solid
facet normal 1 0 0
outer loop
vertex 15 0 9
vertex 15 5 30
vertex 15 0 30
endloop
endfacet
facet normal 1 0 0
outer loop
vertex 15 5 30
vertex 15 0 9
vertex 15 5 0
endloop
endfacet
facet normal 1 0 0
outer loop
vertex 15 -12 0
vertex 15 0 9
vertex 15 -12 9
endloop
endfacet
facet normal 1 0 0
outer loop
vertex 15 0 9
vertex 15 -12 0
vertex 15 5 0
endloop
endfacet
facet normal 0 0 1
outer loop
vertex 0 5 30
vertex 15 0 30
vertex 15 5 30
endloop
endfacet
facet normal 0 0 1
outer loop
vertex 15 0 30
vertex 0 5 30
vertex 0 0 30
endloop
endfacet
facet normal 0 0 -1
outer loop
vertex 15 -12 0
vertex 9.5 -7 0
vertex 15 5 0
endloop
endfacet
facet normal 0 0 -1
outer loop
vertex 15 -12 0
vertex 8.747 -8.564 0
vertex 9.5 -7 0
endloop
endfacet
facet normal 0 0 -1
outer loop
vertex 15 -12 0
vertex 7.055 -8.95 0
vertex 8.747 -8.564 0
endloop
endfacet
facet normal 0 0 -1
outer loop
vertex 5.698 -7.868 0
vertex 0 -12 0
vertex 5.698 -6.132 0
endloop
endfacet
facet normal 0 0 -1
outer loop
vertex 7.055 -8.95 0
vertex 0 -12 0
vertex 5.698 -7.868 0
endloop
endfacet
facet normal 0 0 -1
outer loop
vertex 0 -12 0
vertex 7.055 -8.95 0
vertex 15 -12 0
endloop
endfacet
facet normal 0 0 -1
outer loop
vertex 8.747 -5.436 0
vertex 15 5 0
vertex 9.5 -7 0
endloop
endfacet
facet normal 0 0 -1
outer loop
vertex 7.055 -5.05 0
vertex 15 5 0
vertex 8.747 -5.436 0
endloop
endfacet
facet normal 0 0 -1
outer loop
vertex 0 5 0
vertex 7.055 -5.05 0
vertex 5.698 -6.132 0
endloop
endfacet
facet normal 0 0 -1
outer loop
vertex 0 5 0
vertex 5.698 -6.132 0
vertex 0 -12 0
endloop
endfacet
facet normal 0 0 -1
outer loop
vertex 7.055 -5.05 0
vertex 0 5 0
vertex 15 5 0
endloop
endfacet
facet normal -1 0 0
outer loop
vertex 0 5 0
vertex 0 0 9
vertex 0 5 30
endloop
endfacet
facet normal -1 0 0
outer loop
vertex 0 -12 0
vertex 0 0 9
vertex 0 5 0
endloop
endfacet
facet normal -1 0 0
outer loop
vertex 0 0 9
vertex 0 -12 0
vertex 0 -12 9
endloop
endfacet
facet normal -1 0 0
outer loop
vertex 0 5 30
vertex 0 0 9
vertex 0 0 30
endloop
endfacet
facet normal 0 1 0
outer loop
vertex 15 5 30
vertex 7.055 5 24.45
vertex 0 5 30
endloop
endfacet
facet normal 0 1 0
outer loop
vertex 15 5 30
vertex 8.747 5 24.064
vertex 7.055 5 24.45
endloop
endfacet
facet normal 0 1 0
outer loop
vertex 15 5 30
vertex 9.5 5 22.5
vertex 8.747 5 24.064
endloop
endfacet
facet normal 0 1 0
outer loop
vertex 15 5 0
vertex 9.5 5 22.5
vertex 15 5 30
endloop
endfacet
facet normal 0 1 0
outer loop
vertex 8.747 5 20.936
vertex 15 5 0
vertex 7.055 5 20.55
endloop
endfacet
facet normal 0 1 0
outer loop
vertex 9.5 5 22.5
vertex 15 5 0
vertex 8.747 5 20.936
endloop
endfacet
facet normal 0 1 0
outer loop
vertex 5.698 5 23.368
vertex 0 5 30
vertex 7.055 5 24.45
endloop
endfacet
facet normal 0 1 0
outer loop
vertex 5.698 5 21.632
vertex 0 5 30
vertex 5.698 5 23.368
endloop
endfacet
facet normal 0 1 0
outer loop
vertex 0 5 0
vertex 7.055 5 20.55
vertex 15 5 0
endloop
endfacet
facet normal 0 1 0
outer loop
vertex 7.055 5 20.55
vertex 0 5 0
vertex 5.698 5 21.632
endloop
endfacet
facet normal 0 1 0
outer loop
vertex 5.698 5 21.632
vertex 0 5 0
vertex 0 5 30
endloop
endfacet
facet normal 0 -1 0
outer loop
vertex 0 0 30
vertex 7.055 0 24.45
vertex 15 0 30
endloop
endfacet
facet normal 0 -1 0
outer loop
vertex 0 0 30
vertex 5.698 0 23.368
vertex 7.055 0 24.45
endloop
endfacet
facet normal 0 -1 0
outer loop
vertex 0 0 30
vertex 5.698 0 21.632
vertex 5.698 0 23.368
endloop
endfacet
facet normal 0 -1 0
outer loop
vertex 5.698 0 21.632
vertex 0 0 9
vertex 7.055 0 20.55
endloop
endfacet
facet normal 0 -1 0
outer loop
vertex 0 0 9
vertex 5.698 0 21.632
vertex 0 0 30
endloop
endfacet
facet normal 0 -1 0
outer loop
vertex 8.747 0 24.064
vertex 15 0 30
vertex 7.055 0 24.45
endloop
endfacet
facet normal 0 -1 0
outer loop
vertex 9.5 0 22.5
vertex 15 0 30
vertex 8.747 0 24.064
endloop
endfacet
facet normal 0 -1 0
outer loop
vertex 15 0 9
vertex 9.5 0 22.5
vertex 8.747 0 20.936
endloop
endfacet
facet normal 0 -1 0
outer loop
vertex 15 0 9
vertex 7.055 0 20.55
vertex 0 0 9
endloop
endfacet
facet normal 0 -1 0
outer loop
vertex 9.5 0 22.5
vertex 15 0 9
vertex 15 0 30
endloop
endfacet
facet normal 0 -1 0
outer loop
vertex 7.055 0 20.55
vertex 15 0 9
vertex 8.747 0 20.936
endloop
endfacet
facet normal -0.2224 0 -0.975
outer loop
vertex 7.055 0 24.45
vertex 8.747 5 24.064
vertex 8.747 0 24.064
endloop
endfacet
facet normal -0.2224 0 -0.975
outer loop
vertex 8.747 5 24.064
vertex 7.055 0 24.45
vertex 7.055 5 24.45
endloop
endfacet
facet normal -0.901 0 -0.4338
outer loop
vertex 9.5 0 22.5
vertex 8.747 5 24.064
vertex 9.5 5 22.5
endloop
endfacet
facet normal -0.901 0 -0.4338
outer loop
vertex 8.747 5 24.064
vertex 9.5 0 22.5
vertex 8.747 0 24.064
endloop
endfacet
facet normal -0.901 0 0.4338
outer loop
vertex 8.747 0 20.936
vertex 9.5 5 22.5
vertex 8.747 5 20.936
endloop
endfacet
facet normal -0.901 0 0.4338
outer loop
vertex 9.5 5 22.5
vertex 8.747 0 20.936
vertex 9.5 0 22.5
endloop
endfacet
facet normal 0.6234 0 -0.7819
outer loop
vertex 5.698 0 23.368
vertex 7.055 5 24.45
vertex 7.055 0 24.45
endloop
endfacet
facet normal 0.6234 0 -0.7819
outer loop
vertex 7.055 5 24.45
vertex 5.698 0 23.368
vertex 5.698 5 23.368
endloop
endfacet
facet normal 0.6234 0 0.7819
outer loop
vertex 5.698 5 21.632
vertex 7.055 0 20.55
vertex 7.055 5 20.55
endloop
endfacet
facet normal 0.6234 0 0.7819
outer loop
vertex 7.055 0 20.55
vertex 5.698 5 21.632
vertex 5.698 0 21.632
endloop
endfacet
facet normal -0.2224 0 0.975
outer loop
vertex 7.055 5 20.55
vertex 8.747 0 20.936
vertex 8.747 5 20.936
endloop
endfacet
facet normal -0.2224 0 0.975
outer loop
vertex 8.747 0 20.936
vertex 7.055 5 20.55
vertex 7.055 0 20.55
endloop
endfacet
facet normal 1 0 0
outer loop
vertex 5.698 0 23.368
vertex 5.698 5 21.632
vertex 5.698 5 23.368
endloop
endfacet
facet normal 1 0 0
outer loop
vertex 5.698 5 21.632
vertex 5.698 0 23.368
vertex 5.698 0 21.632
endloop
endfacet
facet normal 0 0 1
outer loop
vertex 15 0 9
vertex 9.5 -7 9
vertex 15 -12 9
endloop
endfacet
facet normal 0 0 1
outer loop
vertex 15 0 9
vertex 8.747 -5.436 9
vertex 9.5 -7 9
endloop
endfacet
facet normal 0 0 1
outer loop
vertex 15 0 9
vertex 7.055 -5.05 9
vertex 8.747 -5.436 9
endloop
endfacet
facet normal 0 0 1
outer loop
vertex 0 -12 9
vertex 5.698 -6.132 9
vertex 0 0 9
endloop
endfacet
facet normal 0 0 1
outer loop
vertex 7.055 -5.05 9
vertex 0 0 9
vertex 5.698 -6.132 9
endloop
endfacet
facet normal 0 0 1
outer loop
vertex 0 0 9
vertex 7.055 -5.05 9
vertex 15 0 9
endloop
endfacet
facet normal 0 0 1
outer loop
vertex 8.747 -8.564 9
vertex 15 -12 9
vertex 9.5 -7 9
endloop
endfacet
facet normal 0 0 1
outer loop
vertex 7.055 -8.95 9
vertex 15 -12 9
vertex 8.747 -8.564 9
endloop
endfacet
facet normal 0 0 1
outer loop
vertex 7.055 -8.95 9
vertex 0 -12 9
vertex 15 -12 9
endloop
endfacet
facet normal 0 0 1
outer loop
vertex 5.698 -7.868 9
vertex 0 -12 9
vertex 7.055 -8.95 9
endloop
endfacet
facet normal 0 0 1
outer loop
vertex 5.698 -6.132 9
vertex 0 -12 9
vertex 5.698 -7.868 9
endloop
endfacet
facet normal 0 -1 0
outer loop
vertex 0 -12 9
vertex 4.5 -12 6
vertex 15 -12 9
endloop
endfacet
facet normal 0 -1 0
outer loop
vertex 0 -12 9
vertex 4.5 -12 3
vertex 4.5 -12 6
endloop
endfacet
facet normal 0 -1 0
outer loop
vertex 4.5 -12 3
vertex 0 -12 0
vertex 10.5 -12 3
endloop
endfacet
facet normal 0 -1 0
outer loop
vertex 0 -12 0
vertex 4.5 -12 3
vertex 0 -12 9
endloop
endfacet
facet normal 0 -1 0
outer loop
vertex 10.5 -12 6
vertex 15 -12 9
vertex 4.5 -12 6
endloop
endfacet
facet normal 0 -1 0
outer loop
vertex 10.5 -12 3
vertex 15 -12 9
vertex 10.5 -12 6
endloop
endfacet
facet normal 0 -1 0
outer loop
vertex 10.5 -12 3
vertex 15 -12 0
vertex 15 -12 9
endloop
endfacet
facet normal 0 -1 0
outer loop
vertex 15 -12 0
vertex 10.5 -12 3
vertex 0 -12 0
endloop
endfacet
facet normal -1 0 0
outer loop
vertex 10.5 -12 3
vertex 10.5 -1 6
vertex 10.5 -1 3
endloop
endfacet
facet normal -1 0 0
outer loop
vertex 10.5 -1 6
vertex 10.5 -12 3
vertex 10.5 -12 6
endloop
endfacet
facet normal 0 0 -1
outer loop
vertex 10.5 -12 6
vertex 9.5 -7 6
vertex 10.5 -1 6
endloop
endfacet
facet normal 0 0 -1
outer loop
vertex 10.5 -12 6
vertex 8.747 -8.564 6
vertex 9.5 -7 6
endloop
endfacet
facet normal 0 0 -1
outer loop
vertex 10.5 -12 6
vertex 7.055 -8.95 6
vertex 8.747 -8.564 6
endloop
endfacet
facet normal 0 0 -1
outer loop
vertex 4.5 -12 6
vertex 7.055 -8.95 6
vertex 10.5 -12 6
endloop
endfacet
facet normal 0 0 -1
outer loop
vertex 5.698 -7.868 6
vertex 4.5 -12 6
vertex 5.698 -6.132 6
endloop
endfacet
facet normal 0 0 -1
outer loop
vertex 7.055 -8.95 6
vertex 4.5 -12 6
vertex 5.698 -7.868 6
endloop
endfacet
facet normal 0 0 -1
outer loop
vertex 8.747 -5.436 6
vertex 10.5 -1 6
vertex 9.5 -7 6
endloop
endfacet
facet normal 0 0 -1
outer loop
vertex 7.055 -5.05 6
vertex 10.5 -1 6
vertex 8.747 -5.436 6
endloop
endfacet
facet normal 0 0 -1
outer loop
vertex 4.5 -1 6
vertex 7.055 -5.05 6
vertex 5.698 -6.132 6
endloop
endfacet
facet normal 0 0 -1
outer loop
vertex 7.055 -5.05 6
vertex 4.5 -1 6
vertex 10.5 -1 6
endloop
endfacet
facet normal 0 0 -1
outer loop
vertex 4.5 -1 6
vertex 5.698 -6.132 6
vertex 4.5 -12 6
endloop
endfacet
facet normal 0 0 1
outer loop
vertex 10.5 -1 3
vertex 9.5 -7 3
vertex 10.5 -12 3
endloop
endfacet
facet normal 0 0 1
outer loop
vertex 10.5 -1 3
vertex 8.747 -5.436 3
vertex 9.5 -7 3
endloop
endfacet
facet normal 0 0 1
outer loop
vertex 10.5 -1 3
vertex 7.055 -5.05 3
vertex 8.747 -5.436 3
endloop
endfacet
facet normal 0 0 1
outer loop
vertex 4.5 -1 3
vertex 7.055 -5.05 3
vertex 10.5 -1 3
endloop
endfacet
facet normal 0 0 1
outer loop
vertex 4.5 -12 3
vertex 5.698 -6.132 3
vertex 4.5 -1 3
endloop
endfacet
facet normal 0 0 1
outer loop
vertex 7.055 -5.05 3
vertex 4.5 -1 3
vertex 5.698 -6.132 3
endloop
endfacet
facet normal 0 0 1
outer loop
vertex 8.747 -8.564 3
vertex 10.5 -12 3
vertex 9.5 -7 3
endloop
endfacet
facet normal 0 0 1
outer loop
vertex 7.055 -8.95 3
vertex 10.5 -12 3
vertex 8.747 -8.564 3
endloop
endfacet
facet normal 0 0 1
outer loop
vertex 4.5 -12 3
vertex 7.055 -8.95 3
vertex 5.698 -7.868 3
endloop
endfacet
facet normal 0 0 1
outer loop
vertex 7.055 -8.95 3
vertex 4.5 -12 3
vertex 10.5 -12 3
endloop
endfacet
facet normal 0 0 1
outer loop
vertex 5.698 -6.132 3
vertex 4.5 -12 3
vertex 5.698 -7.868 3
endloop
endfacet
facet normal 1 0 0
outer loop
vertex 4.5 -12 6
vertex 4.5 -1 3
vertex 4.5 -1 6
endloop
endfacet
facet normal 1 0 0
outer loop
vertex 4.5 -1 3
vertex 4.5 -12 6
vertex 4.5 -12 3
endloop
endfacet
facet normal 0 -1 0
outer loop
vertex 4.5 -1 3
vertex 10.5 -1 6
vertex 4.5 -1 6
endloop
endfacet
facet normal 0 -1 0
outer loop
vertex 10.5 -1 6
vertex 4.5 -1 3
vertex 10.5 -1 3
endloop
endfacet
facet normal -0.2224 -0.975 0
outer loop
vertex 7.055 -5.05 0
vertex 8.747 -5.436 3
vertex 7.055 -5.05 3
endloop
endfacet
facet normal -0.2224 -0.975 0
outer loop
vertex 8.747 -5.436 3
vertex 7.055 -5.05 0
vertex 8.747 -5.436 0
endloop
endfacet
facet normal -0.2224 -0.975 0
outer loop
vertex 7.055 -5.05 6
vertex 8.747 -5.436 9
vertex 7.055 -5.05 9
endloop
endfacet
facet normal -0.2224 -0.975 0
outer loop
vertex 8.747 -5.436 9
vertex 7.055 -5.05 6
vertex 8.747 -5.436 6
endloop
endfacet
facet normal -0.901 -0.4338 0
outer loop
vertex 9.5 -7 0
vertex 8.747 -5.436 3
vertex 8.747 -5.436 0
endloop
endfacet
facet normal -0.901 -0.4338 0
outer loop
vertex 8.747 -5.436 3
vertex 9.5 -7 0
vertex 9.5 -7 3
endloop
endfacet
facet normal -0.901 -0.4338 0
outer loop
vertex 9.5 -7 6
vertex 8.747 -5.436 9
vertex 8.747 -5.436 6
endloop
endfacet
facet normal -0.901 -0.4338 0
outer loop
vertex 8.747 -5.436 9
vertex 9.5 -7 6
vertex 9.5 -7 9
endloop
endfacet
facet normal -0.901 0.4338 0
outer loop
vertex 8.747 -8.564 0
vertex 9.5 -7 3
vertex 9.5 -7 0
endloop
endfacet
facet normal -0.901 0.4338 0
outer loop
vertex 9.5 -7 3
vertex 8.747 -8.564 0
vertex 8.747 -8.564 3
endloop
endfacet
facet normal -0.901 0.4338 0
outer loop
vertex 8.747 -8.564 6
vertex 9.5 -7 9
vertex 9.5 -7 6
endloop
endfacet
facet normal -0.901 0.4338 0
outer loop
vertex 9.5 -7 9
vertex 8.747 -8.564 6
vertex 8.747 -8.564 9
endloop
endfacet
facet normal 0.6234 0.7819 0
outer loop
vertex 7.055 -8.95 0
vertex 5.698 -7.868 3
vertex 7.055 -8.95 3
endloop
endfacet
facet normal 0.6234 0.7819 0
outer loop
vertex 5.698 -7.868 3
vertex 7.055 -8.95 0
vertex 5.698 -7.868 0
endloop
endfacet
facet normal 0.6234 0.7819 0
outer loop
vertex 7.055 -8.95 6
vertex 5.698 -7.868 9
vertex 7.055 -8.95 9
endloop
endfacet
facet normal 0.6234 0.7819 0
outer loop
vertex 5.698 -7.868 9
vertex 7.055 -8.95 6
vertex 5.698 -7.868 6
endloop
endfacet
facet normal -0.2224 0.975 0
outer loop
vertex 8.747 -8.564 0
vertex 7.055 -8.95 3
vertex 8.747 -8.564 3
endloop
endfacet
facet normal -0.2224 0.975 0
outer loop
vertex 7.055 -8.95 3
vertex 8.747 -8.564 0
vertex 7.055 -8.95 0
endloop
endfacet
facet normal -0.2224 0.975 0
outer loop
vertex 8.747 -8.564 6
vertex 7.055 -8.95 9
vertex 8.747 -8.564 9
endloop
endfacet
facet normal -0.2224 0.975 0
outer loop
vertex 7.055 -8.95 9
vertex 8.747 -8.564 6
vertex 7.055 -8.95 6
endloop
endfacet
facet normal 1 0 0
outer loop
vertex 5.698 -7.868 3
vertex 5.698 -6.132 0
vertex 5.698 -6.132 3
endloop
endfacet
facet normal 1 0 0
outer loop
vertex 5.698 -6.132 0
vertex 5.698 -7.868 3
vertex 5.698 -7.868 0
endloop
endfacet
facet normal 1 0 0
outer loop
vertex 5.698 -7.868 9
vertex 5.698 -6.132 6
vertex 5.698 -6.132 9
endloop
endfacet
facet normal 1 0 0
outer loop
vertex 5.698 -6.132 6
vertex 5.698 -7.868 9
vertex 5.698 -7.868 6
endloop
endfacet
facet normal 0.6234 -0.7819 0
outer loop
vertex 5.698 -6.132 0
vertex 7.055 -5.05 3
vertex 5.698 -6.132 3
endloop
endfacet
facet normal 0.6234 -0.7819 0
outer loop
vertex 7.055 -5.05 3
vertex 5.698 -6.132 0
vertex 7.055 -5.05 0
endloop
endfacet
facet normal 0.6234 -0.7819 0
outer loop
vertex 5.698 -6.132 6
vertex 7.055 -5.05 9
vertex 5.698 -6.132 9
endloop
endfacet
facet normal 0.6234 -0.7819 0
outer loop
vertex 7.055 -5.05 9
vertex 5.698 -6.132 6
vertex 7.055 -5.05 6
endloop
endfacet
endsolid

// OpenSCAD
/*
 * file: prusa-i3-z-axis-adjuster.scad
 * author: gregor binder <gregor_reprap@catrix.at>
 * date: 10.11.2013
 * last change: 10.11.2013
 * license: CC BY-NC-SA 3.0
 */

width=15;
heigth=30;
lenght=12;
thickness=5;
thicknessbottom=3;
holediameter=4;
distance=10;

nutsize=6;
nutheight=3;
nutdiagonal=7;


difference() {
	cube([width,thickness,heigth]);
	translate([width/2,thickness+1,heigth-(width/2)])
		rotate([90,0,0])
			cylinder(h=thickness+5,r=holediameter/2);
}
difference() {
	translate([0,-lenght,0])
		cube([width,lenght,thicknessbottom+thicknessbottom+nutheight]);
	translate([(width/2)-(nutsize/2),-(lenght-thickness+6),thicknessbottom])
		cube([nutsize,lenght-thickness+5,nutheight]);
	translate([width/2,-(lenght-thickness),-1])
		cylinder(h=thicknessbottom+thicknessbottom+nutheight+5,r=holediameter/2);
}
